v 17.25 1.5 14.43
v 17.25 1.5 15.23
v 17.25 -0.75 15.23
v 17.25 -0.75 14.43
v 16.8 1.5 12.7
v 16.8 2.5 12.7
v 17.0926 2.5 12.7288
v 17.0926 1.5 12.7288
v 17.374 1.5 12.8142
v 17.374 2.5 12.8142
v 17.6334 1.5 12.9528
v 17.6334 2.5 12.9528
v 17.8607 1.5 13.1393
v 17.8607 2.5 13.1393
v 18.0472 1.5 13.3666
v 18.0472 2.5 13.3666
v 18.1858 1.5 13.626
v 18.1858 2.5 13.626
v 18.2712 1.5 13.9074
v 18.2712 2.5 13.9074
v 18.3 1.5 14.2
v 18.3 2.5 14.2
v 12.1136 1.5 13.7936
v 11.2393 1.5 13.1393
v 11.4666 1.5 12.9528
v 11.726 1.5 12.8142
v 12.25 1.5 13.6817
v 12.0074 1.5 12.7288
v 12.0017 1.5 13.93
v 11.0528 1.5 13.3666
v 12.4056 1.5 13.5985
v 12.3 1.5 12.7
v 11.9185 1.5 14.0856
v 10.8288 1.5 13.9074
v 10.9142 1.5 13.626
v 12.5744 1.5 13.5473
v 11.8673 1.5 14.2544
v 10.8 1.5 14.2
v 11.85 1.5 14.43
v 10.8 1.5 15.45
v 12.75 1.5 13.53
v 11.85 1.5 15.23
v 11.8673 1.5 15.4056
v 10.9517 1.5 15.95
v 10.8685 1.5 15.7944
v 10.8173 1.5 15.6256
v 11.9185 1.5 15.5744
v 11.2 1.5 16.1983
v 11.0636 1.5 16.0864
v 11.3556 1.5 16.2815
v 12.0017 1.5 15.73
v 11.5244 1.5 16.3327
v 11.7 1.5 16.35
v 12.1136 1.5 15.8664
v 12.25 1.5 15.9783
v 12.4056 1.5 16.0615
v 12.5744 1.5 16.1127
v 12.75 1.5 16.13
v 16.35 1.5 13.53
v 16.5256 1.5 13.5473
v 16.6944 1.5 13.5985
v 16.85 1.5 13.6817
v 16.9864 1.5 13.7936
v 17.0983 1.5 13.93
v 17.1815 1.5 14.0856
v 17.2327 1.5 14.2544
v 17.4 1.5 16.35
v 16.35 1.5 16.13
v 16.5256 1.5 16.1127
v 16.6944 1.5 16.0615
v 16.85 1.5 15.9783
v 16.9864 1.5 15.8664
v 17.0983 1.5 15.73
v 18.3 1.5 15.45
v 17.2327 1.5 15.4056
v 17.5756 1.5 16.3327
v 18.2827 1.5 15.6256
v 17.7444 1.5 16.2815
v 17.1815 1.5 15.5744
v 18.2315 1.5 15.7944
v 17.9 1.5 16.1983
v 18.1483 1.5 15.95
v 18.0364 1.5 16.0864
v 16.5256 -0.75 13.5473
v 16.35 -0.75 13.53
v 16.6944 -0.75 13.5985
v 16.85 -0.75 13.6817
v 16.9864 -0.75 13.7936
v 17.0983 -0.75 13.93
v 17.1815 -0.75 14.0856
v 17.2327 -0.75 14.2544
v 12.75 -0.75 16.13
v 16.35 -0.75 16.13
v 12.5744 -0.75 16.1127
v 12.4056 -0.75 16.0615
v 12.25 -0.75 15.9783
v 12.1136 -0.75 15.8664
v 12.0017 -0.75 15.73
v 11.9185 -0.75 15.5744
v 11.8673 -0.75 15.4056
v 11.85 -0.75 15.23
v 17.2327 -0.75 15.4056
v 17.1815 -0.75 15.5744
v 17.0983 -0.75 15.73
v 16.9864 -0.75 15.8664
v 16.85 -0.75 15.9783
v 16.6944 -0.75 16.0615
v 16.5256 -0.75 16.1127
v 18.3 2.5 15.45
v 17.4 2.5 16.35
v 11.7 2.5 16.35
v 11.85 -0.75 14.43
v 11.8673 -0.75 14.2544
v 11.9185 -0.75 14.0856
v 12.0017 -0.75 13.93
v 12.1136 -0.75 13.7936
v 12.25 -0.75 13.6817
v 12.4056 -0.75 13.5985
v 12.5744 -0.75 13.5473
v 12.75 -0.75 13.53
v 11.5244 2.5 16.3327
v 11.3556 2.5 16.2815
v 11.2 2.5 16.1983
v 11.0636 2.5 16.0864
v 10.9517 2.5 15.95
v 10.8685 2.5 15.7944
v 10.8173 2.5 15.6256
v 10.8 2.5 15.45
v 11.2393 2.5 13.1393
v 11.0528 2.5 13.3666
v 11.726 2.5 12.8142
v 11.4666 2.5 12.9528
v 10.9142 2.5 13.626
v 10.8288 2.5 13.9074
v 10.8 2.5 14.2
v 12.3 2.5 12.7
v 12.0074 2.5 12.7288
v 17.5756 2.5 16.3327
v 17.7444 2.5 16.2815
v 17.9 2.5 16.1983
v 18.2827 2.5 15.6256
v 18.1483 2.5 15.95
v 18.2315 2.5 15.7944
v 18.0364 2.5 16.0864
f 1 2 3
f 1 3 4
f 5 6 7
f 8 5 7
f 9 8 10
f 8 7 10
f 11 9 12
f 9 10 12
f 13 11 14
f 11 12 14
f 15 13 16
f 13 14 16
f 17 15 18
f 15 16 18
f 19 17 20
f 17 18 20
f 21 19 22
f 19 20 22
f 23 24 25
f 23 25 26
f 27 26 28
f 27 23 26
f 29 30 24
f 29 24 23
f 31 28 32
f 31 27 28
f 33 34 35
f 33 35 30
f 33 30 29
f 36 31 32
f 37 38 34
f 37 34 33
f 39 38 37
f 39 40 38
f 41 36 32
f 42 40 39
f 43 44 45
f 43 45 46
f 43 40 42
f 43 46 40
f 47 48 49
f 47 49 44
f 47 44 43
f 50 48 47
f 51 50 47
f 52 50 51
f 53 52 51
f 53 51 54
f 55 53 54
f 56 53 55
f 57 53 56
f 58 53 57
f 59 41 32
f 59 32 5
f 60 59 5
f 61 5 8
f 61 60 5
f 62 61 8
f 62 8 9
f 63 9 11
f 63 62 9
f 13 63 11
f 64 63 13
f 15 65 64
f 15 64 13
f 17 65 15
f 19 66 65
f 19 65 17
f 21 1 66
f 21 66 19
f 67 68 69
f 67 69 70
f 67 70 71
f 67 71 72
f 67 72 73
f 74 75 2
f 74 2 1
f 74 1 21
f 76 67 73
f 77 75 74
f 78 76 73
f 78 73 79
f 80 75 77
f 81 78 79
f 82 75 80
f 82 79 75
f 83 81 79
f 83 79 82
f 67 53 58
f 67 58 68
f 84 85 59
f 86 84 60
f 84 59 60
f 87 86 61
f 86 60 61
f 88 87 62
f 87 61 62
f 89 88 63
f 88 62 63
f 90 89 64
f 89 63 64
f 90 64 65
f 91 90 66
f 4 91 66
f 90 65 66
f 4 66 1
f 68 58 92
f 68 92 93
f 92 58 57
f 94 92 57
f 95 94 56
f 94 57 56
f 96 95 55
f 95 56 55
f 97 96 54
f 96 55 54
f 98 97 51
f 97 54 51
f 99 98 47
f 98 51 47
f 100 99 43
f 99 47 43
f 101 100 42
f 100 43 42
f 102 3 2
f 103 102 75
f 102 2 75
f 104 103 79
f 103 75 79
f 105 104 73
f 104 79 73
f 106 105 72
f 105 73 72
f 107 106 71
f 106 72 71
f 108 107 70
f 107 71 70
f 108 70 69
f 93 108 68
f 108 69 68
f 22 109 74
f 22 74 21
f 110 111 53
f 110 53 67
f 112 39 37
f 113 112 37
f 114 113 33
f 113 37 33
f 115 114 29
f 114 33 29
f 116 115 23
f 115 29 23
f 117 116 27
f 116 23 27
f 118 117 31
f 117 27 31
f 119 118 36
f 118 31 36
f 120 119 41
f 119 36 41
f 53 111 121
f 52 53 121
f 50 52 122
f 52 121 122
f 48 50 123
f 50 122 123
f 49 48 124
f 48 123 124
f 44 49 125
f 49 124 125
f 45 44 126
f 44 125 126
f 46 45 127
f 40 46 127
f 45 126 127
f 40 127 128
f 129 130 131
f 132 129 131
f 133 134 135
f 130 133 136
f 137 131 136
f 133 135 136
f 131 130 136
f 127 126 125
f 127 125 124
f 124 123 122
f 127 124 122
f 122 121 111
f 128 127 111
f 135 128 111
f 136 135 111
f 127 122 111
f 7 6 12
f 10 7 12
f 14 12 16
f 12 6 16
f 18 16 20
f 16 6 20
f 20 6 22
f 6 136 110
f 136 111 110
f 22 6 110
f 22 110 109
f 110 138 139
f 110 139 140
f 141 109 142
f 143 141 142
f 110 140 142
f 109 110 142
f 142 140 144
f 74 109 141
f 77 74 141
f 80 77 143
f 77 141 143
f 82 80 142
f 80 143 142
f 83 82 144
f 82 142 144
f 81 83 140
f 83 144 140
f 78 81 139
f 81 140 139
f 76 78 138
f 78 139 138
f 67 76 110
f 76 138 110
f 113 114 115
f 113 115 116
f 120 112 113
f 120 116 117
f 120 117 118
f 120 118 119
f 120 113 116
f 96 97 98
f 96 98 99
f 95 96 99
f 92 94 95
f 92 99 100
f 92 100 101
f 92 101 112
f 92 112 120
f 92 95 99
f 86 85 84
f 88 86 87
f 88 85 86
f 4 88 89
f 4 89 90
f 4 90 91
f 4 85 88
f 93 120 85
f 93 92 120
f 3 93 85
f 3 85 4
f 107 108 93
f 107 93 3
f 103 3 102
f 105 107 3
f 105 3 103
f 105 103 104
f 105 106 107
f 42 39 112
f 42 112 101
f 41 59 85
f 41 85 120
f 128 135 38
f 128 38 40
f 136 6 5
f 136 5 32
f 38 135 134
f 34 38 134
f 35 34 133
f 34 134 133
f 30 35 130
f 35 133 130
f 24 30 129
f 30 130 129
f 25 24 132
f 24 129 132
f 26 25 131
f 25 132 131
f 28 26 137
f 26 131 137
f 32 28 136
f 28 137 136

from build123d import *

# Parameters (mm, degrees)
EXTRUDE015_DEPTH = 1
EXTRUDE014_DEPTH = 2.75


with BuildPart() as extrude015:
    # Sketch015 → Extrude015 (new body)
    with BuildSketch(Plane.XZ):
        with BuildLine():
            ThreePointArc((11.7, 16.35), (11.063604, 16.086396), (10.8, 15.45))
            Line((10.8, 14.2), (10.8, 15.45))
            ThreePointArc((10.8, 14.2), (11.23934, 13.13934), (12.3, 12.7))
            Line((16.8, 12.7), (12.3, 12.7))
            ThreePointArc((16.8, 12.7), (17.86066, 13.13934), (18.3, 14.2))
            Line((18.3, 15.45), (18.3, 14.2))
            ThreePointArc((18.3, 15.45), (18.036396, 16.086396), (17.4, 16.35))
            Line((11.7, 16.35), (17.4, 16.35))
        make_face()
    extrude(amount=EXTRUDE015_DEPTH)


with BuildPart() as extrude015_1:
    # Extrude015 placement: moved
    add(extrude015.part.moved(Location((0, 2.5, 0))))


with BuildPart() as button1:
    # Sketch014 → Extrude014 (new body)
    with BuildSketch(Plane.XZ):
        with BuildLine():
            ThreePointArc((12.75, 16.13), (12.113604, 15.866396), (11.85, 15.23))
            Line((11.85, 14.43), (11.85, 15.23))
            ThreePointArc((11.85, 14.43), (12.113604, 13.793604), (12.75, 13.53))
            Line((16.35, 13.53), (12.75, 13.53))
            ThreePointArc((16.35, 13.53), (16.986396, 13.793604), (17.25, 14.43))
            Line((17.25, 15.23), (17.25, 14.43))
            ThreePointArc((17.25, 15.23), (16.986396, 15.866396), (16.35, 16.13))
            Line((12.75, 16.13), (16.35, 16.13))
        make_face()
    extrude(amount=EXTRUDE014_DEPTH)


with BuildPart() as button1_1:
    # Extrude014 placement: moved
    add(button1.part.moved(Location((0, 2, 0))))

    # Fusion018: union Extrude015
    add(extrude015_1.part)


solid = button1_1.part
